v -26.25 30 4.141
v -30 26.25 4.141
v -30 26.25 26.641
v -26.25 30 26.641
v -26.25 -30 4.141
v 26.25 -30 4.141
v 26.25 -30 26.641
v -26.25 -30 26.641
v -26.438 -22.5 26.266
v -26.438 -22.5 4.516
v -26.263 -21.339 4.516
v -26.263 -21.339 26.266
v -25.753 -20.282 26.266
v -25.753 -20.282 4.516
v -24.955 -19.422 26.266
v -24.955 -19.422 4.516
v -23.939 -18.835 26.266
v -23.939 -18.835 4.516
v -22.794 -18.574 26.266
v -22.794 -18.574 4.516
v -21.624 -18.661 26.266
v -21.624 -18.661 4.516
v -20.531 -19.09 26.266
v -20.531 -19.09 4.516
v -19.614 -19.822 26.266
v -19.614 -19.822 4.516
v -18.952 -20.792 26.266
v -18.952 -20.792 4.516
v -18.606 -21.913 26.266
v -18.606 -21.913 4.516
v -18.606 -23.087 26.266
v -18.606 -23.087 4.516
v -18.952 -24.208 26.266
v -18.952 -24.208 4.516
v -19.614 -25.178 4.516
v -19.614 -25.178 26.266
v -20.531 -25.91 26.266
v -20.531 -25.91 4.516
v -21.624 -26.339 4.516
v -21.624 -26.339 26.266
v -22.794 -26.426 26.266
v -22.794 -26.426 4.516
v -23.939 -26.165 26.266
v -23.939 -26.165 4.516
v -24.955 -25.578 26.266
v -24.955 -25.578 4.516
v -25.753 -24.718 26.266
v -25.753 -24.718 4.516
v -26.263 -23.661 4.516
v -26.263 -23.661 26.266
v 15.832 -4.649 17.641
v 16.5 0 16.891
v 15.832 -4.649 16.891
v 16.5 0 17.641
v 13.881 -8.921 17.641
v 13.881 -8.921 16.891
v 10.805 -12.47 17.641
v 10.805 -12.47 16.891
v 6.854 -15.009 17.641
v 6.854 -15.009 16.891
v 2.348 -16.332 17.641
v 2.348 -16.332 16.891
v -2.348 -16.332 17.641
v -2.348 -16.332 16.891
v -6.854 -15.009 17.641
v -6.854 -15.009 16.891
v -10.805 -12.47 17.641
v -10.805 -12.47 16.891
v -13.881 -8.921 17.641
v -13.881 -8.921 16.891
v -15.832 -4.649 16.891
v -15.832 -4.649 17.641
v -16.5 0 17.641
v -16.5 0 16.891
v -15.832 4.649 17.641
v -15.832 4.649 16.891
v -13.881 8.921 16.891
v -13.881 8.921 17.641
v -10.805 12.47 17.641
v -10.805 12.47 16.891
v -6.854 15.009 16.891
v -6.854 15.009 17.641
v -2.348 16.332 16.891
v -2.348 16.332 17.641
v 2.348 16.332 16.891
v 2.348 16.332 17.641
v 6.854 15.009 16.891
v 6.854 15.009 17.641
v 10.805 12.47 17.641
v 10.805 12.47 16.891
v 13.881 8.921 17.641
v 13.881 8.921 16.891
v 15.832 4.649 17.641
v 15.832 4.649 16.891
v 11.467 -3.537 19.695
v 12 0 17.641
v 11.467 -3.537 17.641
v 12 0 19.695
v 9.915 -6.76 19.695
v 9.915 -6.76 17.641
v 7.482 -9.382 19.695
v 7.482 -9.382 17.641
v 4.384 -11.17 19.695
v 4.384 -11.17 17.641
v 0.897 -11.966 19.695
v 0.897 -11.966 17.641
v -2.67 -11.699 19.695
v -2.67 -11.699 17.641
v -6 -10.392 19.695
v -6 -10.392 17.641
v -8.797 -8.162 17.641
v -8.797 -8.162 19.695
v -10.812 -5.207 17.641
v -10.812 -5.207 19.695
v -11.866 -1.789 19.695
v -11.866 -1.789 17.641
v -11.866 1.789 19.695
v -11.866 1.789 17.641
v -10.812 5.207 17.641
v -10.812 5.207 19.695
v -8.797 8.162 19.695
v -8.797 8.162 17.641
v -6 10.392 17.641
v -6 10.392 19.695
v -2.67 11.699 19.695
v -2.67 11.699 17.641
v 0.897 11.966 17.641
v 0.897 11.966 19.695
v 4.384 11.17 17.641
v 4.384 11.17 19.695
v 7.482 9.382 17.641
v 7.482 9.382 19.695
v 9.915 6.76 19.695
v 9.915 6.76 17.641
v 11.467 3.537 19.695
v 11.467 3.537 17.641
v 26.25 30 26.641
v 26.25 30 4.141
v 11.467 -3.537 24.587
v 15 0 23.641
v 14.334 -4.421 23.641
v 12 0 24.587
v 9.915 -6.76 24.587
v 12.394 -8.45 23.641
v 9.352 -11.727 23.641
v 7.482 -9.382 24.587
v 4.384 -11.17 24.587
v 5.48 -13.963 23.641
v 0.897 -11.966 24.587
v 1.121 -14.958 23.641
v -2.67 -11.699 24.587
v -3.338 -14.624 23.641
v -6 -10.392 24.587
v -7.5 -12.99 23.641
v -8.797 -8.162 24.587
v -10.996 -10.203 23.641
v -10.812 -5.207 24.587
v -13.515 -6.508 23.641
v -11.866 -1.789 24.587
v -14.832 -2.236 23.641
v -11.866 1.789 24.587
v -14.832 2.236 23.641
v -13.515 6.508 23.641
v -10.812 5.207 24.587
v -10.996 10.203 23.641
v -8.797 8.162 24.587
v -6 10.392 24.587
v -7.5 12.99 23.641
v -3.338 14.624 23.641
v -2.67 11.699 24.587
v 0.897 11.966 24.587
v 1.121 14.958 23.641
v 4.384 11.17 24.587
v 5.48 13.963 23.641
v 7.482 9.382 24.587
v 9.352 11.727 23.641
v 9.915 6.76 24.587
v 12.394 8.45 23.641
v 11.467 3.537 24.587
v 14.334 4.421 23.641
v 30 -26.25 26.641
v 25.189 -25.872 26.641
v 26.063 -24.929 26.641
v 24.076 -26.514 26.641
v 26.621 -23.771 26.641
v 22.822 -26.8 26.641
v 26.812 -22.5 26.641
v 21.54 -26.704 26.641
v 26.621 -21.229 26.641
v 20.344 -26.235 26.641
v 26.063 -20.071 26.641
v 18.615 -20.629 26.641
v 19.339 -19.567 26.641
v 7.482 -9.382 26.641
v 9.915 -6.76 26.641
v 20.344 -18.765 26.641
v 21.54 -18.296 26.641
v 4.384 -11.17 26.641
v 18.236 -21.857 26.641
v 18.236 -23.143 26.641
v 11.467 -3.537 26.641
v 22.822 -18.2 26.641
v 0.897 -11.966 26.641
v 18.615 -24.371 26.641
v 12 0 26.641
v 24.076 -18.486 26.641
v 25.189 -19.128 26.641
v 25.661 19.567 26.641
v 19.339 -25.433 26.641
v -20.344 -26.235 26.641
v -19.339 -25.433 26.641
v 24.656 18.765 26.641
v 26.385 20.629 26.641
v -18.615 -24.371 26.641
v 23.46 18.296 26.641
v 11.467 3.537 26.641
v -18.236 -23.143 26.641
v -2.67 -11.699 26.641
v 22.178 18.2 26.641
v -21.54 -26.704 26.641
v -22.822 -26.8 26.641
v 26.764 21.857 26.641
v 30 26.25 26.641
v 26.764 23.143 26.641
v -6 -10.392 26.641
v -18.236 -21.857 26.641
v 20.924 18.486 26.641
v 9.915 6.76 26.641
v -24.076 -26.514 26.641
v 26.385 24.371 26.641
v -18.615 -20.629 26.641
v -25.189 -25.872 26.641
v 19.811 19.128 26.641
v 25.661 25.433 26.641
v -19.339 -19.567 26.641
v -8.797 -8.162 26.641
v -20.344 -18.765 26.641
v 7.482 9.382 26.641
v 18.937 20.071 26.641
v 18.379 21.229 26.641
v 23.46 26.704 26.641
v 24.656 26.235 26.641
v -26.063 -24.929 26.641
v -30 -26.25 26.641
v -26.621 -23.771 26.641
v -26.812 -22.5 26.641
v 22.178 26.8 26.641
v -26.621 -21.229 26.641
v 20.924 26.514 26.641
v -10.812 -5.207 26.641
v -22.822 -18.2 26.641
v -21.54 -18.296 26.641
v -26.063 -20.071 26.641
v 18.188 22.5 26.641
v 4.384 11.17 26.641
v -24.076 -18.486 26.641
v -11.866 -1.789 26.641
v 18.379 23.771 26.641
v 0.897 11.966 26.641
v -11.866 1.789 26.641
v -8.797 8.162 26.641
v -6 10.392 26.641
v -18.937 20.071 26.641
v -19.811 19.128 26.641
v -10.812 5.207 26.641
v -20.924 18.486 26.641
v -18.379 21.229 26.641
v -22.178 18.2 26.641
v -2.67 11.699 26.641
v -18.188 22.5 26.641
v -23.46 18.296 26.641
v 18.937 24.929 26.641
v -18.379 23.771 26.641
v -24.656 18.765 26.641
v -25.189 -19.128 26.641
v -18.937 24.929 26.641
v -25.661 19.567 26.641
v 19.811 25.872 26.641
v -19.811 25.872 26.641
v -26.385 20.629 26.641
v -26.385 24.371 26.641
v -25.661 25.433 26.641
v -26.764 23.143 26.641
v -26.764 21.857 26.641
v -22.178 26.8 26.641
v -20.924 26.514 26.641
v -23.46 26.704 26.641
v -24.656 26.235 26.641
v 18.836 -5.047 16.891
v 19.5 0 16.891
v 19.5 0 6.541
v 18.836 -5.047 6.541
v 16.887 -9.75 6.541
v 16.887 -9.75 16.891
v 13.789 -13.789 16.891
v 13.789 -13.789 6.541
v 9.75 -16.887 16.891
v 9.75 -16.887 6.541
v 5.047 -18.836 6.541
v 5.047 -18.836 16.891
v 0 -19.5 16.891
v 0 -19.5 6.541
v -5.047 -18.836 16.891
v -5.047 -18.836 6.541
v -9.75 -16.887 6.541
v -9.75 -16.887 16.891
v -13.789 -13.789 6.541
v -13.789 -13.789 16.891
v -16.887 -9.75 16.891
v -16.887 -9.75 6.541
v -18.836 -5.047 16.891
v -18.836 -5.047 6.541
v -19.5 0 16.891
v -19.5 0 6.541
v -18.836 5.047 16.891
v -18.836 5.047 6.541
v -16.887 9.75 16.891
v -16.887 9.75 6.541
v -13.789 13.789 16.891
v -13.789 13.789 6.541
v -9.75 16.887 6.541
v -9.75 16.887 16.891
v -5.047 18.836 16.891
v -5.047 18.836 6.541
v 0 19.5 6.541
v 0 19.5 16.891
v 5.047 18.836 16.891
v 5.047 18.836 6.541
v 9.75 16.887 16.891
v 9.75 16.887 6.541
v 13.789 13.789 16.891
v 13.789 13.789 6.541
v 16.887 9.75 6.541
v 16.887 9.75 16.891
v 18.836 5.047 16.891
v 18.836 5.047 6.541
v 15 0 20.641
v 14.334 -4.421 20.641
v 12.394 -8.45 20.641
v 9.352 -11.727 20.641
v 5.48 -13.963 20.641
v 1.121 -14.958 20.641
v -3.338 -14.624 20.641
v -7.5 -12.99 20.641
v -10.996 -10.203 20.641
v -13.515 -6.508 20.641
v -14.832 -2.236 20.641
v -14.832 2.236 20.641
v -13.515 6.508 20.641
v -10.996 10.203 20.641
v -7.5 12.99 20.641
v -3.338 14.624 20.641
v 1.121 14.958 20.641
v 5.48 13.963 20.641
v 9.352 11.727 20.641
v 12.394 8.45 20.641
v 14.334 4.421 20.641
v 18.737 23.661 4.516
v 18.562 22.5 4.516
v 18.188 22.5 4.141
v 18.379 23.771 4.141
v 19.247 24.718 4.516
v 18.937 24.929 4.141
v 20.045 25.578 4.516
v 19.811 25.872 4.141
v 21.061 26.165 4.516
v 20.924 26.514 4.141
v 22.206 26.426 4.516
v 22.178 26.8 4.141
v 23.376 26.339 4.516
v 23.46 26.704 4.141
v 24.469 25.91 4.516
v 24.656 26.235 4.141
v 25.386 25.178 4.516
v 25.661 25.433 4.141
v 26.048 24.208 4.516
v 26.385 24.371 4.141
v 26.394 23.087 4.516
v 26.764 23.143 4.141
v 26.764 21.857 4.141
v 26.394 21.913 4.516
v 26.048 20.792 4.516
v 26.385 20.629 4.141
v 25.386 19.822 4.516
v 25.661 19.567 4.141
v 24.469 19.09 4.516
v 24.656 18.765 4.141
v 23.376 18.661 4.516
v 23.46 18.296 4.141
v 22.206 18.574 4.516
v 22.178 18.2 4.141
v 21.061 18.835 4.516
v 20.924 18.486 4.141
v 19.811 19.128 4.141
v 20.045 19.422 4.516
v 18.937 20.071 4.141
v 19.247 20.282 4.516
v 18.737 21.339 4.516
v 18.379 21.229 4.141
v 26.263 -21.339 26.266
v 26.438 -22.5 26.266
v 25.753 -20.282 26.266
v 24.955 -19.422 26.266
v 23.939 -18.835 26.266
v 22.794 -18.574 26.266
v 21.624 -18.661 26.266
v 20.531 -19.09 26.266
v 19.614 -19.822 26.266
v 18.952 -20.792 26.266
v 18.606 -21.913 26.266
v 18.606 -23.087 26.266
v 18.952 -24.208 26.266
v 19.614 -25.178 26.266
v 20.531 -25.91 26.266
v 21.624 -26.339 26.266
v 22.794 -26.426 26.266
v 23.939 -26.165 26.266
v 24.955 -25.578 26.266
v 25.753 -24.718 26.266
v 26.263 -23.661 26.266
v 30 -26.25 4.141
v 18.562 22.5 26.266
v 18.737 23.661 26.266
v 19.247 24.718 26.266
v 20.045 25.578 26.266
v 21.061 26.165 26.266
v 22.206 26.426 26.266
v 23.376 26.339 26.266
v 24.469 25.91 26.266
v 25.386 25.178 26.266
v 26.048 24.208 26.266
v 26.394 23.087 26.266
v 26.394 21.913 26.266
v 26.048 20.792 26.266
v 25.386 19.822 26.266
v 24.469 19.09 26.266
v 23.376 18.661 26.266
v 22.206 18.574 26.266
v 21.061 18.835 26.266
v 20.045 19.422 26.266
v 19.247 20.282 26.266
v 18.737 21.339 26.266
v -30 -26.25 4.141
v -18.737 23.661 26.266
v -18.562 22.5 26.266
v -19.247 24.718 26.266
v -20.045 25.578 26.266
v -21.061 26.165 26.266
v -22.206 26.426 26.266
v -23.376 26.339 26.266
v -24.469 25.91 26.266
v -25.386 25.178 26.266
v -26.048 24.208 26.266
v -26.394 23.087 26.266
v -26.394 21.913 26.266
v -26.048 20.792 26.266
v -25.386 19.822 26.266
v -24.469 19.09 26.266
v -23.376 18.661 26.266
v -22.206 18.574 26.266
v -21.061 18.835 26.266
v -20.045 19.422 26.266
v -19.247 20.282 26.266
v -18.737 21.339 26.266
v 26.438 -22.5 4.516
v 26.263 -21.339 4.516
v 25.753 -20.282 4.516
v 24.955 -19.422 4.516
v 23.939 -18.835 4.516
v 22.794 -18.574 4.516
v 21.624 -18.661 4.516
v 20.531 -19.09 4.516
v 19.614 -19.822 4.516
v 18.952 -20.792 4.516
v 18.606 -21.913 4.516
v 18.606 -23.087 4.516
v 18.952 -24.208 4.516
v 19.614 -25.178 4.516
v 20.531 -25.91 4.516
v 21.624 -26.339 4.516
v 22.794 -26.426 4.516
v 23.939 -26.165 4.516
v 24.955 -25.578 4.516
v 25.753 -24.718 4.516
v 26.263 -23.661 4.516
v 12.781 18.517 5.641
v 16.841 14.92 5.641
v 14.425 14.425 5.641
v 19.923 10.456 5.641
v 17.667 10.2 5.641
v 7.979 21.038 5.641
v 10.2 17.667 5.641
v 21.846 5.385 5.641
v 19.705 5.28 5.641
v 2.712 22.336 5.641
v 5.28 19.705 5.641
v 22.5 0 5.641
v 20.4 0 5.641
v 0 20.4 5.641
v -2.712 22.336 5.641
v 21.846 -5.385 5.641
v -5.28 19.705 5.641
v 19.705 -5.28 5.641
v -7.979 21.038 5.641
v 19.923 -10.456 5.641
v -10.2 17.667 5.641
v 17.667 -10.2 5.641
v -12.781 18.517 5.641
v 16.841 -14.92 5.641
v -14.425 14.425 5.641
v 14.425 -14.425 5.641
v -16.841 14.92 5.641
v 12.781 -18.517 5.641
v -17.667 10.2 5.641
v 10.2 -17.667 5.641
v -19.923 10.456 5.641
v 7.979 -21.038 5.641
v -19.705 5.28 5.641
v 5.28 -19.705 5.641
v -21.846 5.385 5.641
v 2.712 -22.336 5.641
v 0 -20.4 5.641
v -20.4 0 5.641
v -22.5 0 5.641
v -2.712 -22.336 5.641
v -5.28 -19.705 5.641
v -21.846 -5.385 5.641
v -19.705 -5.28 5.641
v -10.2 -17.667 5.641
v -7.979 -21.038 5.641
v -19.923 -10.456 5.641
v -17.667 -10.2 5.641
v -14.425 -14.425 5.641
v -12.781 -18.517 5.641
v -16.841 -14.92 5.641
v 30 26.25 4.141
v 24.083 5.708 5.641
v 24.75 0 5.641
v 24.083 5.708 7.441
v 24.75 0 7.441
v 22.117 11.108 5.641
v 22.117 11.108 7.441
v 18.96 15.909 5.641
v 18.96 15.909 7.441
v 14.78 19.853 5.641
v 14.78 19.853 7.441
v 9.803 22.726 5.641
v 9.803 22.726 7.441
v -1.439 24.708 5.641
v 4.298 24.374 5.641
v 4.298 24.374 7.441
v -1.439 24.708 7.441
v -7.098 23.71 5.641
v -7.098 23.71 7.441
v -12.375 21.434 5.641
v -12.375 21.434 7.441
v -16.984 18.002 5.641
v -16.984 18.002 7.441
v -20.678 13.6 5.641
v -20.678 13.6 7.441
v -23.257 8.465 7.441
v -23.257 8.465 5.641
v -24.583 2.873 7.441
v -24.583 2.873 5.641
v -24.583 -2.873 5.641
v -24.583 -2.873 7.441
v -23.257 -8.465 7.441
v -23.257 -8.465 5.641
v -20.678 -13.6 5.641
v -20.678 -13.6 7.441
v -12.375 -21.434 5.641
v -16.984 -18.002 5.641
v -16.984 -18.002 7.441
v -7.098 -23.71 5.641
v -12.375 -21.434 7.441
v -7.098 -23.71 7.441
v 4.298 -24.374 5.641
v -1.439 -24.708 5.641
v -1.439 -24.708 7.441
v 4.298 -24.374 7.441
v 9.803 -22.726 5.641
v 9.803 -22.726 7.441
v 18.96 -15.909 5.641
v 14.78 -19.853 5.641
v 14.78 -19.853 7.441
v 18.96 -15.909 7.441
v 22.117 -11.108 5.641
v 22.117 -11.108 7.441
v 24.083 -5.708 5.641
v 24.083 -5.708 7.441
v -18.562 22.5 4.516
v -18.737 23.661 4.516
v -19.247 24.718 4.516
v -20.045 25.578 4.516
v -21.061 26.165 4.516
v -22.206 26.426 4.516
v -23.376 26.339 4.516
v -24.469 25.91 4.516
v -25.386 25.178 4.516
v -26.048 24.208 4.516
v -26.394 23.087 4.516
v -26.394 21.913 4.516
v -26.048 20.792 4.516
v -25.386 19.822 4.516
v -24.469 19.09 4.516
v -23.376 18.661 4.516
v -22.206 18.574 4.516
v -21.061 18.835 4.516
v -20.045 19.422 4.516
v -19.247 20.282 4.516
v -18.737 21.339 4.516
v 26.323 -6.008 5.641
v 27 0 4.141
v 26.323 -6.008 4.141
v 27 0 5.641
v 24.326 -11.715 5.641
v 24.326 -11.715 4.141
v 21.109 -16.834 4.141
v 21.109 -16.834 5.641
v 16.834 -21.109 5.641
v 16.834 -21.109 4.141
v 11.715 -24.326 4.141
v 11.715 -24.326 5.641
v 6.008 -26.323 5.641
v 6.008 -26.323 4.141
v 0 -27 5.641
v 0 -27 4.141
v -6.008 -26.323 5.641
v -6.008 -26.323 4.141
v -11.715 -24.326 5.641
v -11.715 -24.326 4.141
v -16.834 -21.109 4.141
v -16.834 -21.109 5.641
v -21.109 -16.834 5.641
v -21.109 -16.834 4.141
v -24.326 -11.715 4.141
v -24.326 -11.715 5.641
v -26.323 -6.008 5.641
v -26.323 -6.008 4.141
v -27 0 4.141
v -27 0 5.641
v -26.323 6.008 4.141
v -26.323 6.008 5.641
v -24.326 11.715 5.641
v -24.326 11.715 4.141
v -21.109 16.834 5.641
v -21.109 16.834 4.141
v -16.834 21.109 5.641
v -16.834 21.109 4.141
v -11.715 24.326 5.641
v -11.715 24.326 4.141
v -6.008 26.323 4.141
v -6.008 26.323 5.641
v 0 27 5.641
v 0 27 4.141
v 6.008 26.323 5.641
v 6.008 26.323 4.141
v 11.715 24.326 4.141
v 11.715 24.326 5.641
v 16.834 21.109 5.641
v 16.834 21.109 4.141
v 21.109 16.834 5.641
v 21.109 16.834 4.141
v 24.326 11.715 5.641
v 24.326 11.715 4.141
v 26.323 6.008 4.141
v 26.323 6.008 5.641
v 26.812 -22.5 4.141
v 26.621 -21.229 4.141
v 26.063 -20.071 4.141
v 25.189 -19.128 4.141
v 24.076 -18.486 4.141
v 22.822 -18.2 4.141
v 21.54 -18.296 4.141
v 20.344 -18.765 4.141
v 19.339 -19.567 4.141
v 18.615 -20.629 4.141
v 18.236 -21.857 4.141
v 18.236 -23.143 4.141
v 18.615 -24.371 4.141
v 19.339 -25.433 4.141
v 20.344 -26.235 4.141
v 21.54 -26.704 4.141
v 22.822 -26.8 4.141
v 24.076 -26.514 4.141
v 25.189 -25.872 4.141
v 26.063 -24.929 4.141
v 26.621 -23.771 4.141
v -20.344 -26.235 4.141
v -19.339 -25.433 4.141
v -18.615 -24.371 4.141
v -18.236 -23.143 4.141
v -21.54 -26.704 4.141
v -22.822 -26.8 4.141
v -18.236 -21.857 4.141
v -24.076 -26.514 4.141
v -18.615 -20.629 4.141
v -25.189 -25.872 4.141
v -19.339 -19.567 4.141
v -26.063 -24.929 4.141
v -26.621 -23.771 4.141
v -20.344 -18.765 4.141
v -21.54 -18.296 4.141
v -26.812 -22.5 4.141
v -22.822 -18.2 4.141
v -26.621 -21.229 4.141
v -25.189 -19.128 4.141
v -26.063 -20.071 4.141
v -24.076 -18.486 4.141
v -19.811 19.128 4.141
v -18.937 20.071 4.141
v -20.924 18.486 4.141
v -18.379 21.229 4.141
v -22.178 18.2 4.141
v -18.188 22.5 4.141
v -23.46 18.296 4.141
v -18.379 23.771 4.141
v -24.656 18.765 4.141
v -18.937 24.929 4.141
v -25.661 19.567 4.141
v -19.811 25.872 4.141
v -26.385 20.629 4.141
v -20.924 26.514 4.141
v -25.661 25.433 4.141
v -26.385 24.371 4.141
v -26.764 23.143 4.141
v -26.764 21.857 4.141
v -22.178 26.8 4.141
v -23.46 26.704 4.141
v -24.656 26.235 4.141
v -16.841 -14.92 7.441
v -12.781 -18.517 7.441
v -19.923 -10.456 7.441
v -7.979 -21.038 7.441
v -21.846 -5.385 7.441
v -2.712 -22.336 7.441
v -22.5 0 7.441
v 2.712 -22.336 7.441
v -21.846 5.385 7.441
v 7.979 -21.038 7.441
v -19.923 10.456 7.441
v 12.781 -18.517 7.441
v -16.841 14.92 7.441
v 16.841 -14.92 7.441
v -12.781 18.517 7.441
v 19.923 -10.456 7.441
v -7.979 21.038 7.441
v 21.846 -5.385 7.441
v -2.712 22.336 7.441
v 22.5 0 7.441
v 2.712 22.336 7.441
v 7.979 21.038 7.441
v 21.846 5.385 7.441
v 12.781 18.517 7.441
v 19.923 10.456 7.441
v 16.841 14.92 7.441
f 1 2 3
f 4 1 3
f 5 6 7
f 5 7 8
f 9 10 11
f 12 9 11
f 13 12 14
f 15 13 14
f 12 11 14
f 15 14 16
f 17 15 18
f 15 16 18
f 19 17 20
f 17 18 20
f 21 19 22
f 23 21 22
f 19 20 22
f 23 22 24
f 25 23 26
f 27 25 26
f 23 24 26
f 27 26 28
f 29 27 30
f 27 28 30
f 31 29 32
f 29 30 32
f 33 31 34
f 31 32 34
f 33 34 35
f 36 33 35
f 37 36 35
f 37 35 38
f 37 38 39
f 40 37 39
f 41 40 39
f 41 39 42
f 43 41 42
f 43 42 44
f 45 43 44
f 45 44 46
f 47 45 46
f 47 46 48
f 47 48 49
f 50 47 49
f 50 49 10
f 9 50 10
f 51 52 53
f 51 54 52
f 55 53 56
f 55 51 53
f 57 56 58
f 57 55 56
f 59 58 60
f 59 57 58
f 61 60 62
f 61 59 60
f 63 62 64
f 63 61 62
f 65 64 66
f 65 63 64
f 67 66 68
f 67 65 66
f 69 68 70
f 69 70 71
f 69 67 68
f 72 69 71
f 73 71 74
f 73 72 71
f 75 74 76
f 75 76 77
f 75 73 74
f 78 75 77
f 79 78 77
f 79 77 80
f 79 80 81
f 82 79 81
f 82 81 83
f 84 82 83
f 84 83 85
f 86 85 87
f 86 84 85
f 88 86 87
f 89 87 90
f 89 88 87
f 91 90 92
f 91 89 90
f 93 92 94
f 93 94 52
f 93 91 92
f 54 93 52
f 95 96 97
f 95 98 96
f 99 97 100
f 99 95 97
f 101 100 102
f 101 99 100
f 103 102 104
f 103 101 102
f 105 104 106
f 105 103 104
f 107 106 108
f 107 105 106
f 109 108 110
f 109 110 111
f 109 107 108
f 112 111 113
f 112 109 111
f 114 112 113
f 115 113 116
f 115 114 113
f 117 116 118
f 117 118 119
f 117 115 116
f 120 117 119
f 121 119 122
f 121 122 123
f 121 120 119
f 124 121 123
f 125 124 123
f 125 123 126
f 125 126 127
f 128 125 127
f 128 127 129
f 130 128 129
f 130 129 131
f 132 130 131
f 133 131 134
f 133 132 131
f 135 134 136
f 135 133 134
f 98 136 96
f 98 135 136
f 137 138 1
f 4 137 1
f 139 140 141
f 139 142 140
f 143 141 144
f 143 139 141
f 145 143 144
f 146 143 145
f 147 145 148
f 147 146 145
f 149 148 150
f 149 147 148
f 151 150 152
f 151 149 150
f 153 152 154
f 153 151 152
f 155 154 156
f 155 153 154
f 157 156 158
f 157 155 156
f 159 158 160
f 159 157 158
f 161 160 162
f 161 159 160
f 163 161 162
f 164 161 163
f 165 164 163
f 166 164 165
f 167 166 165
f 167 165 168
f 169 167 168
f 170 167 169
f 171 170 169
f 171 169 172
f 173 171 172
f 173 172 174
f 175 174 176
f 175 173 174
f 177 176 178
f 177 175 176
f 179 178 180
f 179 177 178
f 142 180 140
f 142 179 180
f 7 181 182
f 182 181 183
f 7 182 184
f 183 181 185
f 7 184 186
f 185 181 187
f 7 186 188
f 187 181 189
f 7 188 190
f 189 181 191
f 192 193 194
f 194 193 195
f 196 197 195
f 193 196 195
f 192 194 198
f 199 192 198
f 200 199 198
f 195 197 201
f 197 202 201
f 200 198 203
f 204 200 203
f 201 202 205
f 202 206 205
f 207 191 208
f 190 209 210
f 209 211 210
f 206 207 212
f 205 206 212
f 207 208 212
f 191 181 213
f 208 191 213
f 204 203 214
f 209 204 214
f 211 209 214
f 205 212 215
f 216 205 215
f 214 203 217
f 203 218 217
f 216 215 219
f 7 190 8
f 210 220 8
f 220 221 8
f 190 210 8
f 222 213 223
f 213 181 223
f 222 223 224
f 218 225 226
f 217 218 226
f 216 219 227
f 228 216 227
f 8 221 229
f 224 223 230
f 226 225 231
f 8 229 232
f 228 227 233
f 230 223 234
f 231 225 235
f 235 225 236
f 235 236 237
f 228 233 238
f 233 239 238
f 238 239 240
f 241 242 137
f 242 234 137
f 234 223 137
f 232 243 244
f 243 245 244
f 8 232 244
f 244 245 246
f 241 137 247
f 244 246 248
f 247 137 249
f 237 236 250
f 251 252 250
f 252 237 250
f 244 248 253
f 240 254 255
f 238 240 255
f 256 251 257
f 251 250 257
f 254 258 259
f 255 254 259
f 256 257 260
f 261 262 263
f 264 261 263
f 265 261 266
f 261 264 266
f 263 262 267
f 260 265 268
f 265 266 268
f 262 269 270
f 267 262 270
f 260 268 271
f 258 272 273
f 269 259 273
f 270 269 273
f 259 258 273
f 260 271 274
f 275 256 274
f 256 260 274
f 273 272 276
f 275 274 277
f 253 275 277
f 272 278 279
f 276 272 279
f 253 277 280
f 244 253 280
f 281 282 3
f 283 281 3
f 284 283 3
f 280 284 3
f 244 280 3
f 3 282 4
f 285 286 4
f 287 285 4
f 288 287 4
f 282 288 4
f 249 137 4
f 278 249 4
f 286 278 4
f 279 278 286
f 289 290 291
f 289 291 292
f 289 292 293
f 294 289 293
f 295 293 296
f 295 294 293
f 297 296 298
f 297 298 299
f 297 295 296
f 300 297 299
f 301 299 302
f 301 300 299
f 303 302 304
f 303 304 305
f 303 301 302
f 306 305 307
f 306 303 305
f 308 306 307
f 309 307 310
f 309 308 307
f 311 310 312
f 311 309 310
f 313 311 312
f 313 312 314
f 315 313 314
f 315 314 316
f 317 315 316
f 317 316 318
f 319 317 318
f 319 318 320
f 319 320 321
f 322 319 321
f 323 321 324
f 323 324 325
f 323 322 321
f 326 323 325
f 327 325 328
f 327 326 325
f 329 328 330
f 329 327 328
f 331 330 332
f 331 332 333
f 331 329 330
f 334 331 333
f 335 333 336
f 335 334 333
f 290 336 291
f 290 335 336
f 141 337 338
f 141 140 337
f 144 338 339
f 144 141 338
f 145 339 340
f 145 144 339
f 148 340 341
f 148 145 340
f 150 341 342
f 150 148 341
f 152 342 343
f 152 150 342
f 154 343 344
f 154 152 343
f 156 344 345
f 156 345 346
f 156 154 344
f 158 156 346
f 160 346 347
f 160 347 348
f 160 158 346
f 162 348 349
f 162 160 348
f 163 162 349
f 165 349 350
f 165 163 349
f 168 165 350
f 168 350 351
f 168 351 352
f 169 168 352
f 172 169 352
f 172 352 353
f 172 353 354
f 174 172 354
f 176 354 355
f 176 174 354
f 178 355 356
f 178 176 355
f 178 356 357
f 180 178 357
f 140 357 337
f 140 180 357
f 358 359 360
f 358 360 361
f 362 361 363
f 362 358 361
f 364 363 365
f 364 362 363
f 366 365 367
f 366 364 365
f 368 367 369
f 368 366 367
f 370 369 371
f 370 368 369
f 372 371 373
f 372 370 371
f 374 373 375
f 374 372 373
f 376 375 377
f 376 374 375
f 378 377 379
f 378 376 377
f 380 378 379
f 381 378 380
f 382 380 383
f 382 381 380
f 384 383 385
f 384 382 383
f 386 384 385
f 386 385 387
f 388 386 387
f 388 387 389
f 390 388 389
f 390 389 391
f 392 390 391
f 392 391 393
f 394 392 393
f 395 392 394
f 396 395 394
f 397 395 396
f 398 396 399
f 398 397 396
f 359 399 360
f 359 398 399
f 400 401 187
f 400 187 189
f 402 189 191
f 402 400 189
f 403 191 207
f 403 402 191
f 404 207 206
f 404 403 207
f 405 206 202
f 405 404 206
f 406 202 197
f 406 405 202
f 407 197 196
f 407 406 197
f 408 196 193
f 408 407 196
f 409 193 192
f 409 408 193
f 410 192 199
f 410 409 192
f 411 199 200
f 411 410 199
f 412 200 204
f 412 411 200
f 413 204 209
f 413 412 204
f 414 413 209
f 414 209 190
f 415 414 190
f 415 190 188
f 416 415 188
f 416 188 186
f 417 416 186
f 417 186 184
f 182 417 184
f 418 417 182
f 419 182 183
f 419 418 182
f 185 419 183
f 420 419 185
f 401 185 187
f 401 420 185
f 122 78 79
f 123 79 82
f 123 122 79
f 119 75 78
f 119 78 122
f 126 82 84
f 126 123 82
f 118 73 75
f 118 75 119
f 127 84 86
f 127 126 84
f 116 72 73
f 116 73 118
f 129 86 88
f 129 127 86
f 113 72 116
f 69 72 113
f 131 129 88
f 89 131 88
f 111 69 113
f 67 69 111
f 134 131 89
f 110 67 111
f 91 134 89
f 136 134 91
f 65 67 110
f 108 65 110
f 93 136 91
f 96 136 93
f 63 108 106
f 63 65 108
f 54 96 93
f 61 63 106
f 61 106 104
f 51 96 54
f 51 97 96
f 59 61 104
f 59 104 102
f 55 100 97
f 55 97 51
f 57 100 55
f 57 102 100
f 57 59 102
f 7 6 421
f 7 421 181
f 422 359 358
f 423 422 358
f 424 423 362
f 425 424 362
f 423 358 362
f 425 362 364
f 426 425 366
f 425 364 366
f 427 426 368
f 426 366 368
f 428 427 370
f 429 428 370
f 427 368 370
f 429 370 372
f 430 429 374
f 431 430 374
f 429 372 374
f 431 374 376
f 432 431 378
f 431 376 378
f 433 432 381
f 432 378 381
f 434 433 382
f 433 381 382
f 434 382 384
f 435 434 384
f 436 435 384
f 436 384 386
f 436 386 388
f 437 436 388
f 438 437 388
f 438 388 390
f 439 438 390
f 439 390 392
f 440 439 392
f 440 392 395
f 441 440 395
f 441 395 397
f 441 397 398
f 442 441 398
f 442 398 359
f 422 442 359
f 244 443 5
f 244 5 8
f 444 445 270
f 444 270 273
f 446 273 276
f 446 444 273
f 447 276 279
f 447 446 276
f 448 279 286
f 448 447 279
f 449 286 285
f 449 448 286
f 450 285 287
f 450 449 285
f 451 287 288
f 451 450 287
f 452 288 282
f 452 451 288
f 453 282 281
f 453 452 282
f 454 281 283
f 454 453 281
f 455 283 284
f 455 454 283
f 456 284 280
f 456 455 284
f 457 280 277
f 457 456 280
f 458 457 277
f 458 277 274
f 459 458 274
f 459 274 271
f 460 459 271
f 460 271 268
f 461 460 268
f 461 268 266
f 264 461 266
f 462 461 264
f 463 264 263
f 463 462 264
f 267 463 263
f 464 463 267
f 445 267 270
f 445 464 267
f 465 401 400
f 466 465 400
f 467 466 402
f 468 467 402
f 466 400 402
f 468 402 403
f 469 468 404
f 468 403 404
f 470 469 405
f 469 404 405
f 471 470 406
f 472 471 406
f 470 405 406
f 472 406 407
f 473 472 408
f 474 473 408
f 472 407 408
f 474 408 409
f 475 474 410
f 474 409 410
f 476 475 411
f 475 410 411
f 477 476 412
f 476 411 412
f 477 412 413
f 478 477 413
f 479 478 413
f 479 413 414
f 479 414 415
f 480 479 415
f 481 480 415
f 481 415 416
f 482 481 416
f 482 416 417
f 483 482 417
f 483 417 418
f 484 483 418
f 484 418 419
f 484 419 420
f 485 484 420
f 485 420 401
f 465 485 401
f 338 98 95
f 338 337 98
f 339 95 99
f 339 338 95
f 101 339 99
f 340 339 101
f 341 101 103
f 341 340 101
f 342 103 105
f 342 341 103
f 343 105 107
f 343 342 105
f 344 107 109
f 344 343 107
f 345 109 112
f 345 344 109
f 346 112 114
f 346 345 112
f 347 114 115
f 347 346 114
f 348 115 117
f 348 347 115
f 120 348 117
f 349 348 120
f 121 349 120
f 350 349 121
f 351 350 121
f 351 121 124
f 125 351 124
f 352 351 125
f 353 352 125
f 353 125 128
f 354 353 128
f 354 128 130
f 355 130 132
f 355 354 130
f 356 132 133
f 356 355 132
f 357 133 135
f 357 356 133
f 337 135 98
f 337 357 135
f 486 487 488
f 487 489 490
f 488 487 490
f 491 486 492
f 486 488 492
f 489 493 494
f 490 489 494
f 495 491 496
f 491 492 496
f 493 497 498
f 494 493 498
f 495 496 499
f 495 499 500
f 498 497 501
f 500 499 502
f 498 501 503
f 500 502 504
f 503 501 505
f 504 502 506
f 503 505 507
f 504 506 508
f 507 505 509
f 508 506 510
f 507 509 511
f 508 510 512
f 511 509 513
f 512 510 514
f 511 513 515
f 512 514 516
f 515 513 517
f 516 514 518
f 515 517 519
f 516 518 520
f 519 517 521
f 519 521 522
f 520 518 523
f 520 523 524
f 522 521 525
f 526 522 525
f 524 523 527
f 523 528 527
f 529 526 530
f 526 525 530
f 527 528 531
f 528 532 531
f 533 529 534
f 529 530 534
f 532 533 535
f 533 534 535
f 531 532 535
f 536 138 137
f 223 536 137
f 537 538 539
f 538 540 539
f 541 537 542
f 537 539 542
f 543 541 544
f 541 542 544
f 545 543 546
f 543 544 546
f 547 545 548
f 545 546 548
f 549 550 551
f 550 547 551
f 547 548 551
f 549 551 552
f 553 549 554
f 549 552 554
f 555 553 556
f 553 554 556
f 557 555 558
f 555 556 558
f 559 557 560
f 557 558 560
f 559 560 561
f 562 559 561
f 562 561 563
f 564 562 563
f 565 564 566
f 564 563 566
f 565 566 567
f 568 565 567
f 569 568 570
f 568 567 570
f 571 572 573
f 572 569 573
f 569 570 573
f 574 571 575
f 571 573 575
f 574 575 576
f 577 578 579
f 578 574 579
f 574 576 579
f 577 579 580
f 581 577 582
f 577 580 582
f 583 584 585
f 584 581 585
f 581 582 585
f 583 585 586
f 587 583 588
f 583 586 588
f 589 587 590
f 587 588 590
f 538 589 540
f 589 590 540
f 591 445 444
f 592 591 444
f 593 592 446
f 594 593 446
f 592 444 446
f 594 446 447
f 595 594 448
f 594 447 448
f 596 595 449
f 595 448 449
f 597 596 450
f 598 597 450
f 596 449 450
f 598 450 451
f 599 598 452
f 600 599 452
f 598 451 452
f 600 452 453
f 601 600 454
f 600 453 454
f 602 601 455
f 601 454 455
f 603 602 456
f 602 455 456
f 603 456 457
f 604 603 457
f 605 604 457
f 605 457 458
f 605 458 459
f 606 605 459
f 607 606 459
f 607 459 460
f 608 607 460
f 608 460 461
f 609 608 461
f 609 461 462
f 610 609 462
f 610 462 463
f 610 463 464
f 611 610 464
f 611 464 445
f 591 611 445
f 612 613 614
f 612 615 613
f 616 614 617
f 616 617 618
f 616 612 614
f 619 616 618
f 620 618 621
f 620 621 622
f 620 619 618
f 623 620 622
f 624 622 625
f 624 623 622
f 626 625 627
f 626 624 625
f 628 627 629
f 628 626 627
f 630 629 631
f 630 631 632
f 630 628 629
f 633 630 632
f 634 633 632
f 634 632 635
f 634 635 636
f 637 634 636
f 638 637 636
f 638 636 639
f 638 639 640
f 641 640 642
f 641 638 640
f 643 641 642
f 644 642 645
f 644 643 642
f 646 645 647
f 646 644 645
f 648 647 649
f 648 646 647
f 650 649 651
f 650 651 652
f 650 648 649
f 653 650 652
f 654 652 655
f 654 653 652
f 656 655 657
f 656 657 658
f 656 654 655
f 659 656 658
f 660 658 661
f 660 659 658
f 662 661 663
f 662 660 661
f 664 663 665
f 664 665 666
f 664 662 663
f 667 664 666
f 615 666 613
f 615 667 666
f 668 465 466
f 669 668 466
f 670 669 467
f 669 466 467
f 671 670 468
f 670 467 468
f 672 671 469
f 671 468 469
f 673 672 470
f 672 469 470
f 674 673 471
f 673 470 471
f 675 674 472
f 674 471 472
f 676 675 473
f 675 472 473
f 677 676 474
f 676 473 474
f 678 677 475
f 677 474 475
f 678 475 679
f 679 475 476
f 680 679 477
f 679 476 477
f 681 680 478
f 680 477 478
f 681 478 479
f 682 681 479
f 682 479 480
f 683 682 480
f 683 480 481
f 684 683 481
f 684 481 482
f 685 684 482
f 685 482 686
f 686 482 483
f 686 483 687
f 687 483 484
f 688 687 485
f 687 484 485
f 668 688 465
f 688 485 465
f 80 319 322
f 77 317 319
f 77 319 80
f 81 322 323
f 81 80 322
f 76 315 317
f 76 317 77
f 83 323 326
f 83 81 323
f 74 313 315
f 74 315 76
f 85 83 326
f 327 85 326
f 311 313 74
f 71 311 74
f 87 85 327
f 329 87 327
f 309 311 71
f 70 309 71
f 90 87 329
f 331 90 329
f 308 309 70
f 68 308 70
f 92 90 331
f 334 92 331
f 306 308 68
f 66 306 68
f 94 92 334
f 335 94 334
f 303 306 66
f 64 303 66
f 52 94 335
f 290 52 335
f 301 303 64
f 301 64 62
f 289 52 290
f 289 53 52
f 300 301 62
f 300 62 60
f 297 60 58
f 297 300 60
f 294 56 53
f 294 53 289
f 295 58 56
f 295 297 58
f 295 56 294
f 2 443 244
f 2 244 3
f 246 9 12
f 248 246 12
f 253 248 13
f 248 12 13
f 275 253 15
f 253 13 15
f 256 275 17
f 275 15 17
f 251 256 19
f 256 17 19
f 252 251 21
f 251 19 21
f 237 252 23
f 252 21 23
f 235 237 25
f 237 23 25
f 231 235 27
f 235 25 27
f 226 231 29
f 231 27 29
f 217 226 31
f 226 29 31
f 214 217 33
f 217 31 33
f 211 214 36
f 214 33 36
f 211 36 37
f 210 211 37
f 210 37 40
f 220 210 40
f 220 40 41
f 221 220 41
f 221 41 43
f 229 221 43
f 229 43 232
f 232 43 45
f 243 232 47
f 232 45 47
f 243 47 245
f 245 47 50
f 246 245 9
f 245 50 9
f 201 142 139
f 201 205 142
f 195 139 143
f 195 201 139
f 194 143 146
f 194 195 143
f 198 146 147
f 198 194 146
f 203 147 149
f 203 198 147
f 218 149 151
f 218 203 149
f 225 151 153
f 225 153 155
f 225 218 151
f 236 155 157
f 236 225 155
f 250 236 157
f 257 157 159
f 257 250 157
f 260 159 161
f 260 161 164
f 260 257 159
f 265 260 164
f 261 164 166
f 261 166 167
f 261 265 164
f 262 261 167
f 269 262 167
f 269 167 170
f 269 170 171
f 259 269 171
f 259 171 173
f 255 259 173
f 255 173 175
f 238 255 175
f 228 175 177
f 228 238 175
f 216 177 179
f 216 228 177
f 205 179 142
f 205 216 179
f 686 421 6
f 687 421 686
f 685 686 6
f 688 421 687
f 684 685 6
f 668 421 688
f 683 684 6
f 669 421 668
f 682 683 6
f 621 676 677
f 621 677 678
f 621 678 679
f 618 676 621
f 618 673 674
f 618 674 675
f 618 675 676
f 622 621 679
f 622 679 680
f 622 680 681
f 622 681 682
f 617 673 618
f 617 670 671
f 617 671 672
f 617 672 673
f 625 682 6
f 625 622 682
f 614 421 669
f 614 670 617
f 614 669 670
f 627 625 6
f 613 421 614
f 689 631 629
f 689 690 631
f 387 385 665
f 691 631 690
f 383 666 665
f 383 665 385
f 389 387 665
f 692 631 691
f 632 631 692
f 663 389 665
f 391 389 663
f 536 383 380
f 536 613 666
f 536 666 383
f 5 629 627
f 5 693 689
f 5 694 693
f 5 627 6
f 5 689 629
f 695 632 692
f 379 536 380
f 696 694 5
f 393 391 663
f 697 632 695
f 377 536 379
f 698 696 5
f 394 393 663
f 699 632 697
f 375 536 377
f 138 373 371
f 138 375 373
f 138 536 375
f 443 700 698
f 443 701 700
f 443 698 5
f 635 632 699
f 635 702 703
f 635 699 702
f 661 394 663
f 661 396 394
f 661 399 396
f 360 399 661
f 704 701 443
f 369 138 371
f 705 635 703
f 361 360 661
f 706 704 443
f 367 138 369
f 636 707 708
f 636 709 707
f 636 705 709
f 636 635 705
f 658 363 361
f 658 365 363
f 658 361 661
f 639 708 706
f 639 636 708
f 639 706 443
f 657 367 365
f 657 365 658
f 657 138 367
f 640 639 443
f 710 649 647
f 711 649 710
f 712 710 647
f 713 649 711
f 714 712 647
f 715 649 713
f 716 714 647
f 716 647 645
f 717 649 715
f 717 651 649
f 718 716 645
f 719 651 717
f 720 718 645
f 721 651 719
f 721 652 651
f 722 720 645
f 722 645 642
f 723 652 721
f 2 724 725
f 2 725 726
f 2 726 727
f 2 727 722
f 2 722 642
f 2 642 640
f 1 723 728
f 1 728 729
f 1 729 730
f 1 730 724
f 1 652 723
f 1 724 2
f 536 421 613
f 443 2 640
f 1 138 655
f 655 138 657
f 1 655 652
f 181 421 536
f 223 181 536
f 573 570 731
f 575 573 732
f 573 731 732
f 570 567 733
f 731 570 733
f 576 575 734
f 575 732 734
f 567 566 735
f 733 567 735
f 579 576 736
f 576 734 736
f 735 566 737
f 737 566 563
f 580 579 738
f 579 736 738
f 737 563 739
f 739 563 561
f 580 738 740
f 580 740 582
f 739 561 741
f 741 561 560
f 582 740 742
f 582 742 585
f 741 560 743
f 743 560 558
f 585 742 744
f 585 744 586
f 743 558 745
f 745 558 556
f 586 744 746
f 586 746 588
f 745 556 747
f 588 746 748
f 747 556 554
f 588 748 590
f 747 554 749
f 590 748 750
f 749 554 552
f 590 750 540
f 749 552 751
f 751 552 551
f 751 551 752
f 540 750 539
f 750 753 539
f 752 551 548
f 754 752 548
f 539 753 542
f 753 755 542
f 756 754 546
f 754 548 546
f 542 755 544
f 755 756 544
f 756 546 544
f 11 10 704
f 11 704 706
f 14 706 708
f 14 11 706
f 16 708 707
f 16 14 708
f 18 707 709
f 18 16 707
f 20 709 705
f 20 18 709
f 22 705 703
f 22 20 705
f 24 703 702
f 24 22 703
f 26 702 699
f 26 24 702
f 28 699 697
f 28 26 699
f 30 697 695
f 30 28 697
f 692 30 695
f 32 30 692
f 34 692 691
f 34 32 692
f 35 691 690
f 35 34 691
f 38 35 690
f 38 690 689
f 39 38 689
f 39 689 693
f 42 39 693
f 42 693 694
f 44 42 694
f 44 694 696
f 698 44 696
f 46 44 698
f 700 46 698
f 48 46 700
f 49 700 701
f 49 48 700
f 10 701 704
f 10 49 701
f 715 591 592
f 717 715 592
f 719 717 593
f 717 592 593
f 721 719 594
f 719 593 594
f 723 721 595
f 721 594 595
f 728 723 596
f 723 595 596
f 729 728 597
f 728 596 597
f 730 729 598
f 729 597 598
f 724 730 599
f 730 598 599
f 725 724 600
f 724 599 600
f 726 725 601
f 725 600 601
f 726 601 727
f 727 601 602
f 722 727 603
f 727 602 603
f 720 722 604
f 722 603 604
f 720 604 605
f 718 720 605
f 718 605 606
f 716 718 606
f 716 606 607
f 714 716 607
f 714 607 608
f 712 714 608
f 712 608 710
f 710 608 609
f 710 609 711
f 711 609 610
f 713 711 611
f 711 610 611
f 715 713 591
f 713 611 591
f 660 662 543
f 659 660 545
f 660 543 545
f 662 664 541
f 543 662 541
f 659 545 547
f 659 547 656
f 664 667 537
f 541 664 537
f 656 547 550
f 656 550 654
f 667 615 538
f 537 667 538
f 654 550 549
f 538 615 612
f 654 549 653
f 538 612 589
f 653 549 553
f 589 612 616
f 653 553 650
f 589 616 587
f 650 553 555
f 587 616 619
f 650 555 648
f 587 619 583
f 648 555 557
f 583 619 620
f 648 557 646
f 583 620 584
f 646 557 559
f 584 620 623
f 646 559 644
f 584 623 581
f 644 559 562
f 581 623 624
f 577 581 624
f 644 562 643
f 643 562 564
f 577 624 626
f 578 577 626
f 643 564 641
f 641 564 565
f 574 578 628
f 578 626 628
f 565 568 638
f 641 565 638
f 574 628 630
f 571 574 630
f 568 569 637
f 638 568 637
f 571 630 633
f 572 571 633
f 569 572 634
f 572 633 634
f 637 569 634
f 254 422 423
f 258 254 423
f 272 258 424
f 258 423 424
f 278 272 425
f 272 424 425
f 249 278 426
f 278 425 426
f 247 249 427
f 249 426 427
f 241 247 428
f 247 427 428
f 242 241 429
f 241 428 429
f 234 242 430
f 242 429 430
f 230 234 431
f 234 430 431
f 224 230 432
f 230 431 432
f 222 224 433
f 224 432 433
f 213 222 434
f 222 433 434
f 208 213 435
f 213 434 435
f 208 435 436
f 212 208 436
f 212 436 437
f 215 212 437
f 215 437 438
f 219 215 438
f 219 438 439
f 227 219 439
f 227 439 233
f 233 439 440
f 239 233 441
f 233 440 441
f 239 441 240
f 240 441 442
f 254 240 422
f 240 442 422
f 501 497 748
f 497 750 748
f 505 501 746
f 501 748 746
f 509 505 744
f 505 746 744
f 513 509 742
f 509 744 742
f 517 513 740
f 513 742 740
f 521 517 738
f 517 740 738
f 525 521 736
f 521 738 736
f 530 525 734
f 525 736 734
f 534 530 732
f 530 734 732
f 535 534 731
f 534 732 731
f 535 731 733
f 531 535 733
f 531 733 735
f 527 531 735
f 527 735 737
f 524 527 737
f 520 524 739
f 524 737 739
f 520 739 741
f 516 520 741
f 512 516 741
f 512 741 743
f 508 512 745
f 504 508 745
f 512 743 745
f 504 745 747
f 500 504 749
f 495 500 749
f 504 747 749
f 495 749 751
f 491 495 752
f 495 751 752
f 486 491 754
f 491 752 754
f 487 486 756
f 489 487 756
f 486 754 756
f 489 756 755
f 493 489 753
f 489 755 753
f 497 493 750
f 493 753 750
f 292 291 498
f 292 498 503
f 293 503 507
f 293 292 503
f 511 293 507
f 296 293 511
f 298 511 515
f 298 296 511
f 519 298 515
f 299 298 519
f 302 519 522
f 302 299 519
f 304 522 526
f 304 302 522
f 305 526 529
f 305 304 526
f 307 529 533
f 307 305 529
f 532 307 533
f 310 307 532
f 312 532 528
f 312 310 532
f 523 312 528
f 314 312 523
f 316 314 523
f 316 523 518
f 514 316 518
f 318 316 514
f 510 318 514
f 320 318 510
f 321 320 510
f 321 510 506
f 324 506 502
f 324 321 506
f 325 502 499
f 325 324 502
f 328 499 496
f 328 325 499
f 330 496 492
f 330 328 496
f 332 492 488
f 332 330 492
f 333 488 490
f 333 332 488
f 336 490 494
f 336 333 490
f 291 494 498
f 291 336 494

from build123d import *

# Parameters (mm, degrees)
SKETCH1_W                        = 80
SKETCH1_H                        = 80
BOSS_EXTRUDE1_DEPTH              = 30
M56_CLEARANCE_HOLE1_D            = 66
M56_CLEARANCE_HOLE1_DEPTH        = 4.4
SKETCH4_W                        = 3
SKETCH4_H                        = 2
SKETCH5_W                        = 30
SKETCH5_H                        = 2.4
F_10_5_10_5_DIAMETER_HOLE1_D     = 10.5
F_10_5_10_5_DIAMETER_HOLE1_DEPTH = 30
F_10_5_10_5_DIAMETER_HOLE2_D     = 10.5
F_10_5_10_5_DIAMETER_HOLE2_DEPTH = 30
CHAMFER1_SIZE                    = 5
CHAMFER2_SIZE                    = 0.5
CHAMFER3_SIZE                    = 1.2
SCALE1_SCALE                     = 0.75


with BuildPart() as part:
    # Sketch1 → Boss-Extrude1 (new body)
    with BuildSketch(Plane(origin=(0, 0, 0), x_dir=(-1, 0, 0), z_dir=(0, 0, -1))):
        Rectangle(SKETCH1_W, SKETCH1_H)
    extrude(amount=-BOSS_EXTRUDE1_DEPTH)

    # M56 Clearance Hole1
    with Locations(Plane(origin=(0, 0, 0), x_dir=(-1, 0, 0), z_dir=(0, 0, -1))):
        with Locations((0, 0)):
            Hole(M56_CLEARANCE_HOLE1_D / 2, depth=M56_CLEARANCE_HOLE1_DEPTH)

    # Sketch4 → Cut-Revolve1 (revolve, cut)
    with BuildSketch(Plane.XZ):
        with Locations((34.5, 1)):
            Rectangle(SKETCH4_W, SKETCH4_H)
    revolve(axis=Axis((0, 0, 2), (0, 0, -1)), mode=Mode.SUBTRACT)

    # Sketch5 → Revolve1 (revolve)
    with BuildSketch(Plane.XZ):
        with Locations((15, 3.2)):
            Rectangle(SKETCH5_W, SKETCH5_H)
    revolve(axis=Axis((0, 0, 4.4), (0, 0, -1)))

    # Sketch6 → Cut-Revolve2 (revolve, cut)
    with BuildSketch(Plane.XZ):
        Polygon((16, 30), (0, 30), (0, 2), (26, 2), (26, 17), (22, 17), (22, 18), (16, 18), (16, 20.738804844), (20, 22), (20, 26), (16, 27.261195156), align=None)
    revolve(axis=Axis((0, 0, 30), (0, 0, -1)), mode=Mode.SUBTRACT)

    # Ø10.5 (10.5) Diameter Hole1
    with Locations(Plane.XY.offset(30)):
        with Locations((-30, -30), (30, 30)):
            Hole(F_10_5_10_5_DIAMETER_HOLE1_D / 2, depth=F_10_5_10_5_DIAMETER_HOLE1_DEPTH)

    # Ø10.5 (10.5) Diameter Hole2
    with Locations(Plane(origin=(0, 0, 0), x_dir=(-1, 0, 0), z_dir=(0, 0, -1))):
        with Locations((30, 30), (-30, -30)):
            Hole(F_10_5_10_5_DIAMETER_HOLE2_D / 2, depth=F_10_5_10_5_DIAMETER_HOLE2_DEPTH)

    # Chamfer1
    chamfer1_edges = [part.edges().sort_by_distance(p)[0] for p in [
        (-40, -40, 15),
        (40, -40, 15),
        (40, 40, 15),
        (-40, 40, 15),
    ]]
    chamfer(chamfer1_edges, length=CHAMFER1_SIZE)

    # Chamfer2
    chamfer2_edges = [part.edges().sort_by_distance(p)[0] for p in [
        (35.25, 30, 30),
        (35.25, 30, 0),
        (-24.75, -30, 30),
        (-24.75, -30, 0),
        (24.75, -30, 0),
        (24.75, -30, 30),
        (-35.25, 30, 0),
        (-35.25, 30, 30),
    ]]
    chamfer(chamfer2_edges, length=CHAMFER2_SIZE)

    # Chamfer3
    chamfer3_edges = [part.edges().sort_by_distance(p)[0] for p in [
        (-26, 0, 2),
    ]]
    chamfer(chamfer3_edges, length=CHAMFER3_SIZE)


with BuildPart() as part_1:
    # Scale1: scaled about (0, 0, 16.565087269)
    add(part.part.scale(SCALE1_SCALE).moved(Location((0, 0, 4.141271817))))


solid = part_1.part
